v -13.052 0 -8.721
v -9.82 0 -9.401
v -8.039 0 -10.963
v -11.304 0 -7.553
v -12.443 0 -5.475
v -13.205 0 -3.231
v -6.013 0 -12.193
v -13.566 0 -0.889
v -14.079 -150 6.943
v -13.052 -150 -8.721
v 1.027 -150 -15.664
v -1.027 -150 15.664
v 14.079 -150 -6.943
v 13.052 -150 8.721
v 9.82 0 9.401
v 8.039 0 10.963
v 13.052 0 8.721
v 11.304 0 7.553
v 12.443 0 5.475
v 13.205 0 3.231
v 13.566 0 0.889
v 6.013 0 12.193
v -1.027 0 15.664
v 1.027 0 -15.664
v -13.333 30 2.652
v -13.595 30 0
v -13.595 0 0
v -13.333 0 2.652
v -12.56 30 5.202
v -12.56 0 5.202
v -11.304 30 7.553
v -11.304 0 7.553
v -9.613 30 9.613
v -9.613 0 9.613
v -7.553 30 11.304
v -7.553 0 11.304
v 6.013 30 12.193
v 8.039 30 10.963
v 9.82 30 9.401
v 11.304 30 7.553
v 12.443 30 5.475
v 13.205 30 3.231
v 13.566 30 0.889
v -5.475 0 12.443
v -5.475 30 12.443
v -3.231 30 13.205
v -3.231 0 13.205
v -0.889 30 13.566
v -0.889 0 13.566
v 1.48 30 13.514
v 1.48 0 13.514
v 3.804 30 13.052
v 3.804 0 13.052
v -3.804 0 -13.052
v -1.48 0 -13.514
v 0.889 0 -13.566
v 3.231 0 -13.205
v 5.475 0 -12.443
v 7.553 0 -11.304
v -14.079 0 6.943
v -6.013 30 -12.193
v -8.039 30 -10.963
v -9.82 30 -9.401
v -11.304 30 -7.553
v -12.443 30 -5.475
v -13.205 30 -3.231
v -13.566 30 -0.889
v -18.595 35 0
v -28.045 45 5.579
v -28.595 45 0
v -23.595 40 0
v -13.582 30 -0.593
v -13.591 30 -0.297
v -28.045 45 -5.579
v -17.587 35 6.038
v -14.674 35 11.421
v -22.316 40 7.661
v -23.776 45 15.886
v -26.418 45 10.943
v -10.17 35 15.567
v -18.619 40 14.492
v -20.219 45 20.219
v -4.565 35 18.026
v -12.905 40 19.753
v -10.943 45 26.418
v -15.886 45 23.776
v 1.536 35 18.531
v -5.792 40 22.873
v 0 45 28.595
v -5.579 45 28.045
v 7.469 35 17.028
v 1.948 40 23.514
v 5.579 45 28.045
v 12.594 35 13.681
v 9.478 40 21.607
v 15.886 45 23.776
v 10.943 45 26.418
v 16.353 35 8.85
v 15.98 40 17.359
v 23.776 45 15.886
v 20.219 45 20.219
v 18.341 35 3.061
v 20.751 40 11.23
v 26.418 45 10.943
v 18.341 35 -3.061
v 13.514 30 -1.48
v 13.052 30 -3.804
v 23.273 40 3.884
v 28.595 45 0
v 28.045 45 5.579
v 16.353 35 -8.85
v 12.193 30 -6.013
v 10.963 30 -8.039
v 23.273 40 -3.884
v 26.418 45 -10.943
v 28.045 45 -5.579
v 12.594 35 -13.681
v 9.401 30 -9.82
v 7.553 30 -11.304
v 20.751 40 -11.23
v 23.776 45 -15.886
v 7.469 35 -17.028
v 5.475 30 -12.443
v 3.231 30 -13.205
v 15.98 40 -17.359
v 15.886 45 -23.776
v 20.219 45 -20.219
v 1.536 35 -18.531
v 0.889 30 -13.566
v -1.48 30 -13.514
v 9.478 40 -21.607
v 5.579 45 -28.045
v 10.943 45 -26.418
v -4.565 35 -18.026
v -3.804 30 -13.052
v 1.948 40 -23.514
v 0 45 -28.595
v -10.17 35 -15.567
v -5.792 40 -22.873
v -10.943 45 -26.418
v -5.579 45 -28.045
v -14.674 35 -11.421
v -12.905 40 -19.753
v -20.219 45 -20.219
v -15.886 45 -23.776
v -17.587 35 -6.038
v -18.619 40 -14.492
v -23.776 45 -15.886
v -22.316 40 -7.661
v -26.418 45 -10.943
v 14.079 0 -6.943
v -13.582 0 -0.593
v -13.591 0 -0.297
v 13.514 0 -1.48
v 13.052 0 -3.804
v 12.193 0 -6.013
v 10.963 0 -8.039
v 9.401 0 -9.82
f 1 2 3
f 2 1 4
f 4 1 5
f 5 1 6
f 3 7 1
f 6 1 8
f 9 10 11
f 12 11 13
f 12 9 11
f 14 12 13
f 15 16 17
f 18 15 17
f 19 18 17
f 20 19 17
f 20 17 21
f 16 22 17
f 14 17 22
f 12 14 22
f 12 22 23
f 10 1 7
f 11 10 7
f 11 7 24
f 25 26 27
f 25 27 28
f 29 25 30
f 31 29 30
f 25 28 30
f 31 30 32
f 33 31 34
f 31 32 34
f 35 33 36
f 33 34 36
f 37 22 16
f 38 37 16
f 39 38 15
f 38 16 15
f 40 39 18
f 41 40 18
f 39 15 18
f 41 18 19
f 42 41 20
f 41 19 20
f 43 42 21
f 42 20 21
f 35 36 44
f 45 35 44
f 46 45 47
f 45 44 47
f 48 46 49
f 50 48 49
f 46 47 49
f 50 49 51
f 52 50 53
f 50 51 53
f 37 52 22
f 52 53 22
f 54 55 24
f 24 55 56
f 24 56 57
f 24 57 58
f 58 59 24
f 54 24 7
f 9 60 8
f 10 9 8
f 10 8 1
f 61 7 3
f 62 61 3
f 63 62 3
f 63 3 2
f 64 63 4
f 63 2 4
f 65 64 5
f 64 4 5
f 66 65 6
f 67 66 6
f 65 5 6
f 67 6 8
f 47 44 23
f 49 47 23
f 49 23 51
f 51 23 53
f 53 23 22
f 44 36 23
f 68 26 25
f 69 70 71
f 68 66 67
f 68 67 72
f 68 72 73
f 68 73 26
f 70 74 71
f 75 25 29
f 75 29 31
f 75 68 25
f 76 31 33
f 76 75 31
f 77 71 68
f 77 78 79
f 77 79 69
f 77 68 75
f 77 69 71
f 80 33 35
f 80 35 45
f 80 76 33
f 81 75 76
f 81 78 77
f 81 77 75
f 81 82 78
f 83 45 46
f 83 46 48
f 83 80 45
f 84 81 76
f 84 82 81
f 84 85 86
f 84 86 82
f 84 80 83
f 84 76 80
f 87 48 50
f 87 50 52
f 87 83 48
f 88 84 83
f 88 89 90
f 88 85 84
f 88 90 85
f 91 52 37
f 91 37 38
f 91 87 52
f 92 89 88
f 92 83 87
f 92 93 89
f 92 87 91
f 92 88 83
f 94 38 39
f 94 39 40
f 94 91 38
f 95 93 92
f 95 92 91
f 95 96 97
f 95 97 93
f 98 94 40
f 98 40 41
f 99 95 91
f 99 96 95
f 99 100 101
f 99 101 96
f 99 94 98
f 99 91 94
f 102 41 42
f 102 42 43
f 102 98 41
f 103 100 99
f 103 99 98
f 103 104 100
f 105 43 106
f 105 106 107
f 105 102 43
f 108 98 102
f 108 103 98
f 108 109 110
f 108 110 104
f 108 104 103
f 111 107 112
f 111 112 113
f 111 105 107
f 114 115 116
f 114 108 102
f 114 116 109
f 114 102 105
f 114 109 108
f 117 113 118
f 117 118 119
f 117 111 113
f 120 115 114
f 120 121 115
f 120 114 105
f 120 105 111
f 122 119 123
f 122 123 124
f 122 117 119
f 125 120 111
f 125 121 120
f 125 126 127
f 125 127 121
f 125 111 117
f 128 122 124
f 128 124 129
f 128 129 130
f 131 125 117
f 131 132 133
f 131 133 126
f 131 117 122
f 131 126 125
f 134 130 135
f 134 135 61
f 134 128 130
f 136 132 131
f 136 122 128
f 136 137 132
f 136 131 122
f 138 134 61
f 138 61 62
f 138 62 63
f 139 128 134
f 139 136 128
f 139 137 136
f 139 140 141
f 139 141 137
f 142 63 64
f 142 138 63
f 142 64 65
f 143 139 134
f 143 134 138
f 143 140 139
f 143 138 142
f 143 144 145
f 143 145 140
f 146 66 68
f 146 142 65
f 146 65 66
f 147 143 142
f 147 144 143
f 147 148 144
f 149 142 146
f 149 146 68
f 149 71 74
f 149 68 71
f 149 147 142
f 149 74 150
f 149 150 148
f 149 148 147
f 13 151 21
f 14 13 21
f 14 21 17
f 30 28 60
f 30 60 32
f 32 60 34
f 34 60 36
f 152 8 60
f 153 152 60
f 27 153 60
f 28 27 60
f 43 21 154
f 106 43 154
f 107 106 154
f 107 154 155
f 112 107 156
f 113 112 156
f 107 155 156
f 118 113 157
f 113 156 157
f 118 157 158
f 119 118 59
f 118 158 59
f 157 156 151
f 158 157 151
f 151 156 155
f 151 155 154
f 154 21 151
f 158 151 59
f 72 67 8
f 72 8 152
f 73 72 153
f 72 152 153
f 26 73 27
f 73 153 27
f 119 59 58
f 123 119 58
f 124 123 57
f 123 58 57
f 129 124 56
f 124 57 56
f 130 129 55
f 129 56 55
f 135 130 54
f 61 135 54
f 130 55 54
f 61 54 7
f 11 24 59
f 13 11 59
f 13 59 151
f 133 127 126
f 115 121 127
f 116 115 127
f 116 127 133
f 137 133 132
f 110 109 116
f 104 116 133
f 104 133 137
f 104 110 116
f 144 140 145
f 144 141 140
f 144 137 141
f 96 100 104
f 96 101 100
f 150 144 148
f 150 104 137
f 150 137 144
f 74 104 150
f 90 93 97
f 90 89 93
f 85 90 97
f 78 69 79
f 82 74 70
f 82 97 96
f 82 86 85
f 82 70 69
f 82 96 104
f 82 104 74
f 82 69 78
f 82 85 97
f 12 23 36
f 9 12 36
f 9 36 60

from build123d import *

# Parameters (mm, degrees)
F1_DEPTH  = 150
F3_DEPTH  = 30
F3_FACE_R = 13.5946213818
F4_DEPTH  = 15
F4_TAPER  = -45


with BuildPart() as f1:
    # F0 (on Front) → F1 (new body)
    with BuildSketch(Plane.XZ):
        Polygon((13.0521743593, 8.7211840853), (-1.0266797893, 15.6641066124), (-14.0788541486, 6.9429225271), (-13.0521743593, -8.7211840853), (1.0266797893, -15.6641066124), (14.0788541486, -6.9429225271), align=None)
    extrude(amount=F1_DEPTH)

    # F2 (on face) → F3 (join)
    with BuildSketch(Plane(origin=(0, 0, 0), x_dir=(-1, 0, 0), z_dir=(0, 1, 0))):
        with BuildLine():
            ThreePointArc((13.5655142354, -0.8891310612), (13.5873426467, -0.4448036842), (13.5946213818, 0))
            ThreePointArc((13.5946213818, 0), (11.9893857748, 6.4084599756), (7.5527673124, 11.3035143403))
            ThreePointArc((7.5527673124, 11.3035143403), (0.8891311409, 13.5655142302), (-6.012747005, 12.1926454869))
            ThreePointArc((-6.012747005, 12.1926454869), (-11.3035143729, 7.5527672636), (-13.565514228, 0.8891311747))
            ThreePointArc((-13.565514228, 0.8891311747), (-12.1926455438, -6.0127468897), (-7.5527673722, -11.3035143003))
            ThreePointArc((-7.5527673722, -11.3035143003), (-0.8891308824, -13.5655142471), (6.0127475341, -12.192645226))
            ThreePointArc((6.0127475341, -12.192645226), (11.3035145684, -7.552766971), (13.5655142354, -0.8891310612))
        make_face()
    extrude(amount=F3_DEPTH)

    # F3_face (on face) → F4 (join)
    with BuildSketch(Plane(origin=(0, 30, 0), x_dir=(-1, 0, 0), z_dir=(0, 1, 0))):
        Circle(F3_FACE_R)
    extrude(amount=F4_DEPTH, taper=F4_TAPER)


solid = f1.part
